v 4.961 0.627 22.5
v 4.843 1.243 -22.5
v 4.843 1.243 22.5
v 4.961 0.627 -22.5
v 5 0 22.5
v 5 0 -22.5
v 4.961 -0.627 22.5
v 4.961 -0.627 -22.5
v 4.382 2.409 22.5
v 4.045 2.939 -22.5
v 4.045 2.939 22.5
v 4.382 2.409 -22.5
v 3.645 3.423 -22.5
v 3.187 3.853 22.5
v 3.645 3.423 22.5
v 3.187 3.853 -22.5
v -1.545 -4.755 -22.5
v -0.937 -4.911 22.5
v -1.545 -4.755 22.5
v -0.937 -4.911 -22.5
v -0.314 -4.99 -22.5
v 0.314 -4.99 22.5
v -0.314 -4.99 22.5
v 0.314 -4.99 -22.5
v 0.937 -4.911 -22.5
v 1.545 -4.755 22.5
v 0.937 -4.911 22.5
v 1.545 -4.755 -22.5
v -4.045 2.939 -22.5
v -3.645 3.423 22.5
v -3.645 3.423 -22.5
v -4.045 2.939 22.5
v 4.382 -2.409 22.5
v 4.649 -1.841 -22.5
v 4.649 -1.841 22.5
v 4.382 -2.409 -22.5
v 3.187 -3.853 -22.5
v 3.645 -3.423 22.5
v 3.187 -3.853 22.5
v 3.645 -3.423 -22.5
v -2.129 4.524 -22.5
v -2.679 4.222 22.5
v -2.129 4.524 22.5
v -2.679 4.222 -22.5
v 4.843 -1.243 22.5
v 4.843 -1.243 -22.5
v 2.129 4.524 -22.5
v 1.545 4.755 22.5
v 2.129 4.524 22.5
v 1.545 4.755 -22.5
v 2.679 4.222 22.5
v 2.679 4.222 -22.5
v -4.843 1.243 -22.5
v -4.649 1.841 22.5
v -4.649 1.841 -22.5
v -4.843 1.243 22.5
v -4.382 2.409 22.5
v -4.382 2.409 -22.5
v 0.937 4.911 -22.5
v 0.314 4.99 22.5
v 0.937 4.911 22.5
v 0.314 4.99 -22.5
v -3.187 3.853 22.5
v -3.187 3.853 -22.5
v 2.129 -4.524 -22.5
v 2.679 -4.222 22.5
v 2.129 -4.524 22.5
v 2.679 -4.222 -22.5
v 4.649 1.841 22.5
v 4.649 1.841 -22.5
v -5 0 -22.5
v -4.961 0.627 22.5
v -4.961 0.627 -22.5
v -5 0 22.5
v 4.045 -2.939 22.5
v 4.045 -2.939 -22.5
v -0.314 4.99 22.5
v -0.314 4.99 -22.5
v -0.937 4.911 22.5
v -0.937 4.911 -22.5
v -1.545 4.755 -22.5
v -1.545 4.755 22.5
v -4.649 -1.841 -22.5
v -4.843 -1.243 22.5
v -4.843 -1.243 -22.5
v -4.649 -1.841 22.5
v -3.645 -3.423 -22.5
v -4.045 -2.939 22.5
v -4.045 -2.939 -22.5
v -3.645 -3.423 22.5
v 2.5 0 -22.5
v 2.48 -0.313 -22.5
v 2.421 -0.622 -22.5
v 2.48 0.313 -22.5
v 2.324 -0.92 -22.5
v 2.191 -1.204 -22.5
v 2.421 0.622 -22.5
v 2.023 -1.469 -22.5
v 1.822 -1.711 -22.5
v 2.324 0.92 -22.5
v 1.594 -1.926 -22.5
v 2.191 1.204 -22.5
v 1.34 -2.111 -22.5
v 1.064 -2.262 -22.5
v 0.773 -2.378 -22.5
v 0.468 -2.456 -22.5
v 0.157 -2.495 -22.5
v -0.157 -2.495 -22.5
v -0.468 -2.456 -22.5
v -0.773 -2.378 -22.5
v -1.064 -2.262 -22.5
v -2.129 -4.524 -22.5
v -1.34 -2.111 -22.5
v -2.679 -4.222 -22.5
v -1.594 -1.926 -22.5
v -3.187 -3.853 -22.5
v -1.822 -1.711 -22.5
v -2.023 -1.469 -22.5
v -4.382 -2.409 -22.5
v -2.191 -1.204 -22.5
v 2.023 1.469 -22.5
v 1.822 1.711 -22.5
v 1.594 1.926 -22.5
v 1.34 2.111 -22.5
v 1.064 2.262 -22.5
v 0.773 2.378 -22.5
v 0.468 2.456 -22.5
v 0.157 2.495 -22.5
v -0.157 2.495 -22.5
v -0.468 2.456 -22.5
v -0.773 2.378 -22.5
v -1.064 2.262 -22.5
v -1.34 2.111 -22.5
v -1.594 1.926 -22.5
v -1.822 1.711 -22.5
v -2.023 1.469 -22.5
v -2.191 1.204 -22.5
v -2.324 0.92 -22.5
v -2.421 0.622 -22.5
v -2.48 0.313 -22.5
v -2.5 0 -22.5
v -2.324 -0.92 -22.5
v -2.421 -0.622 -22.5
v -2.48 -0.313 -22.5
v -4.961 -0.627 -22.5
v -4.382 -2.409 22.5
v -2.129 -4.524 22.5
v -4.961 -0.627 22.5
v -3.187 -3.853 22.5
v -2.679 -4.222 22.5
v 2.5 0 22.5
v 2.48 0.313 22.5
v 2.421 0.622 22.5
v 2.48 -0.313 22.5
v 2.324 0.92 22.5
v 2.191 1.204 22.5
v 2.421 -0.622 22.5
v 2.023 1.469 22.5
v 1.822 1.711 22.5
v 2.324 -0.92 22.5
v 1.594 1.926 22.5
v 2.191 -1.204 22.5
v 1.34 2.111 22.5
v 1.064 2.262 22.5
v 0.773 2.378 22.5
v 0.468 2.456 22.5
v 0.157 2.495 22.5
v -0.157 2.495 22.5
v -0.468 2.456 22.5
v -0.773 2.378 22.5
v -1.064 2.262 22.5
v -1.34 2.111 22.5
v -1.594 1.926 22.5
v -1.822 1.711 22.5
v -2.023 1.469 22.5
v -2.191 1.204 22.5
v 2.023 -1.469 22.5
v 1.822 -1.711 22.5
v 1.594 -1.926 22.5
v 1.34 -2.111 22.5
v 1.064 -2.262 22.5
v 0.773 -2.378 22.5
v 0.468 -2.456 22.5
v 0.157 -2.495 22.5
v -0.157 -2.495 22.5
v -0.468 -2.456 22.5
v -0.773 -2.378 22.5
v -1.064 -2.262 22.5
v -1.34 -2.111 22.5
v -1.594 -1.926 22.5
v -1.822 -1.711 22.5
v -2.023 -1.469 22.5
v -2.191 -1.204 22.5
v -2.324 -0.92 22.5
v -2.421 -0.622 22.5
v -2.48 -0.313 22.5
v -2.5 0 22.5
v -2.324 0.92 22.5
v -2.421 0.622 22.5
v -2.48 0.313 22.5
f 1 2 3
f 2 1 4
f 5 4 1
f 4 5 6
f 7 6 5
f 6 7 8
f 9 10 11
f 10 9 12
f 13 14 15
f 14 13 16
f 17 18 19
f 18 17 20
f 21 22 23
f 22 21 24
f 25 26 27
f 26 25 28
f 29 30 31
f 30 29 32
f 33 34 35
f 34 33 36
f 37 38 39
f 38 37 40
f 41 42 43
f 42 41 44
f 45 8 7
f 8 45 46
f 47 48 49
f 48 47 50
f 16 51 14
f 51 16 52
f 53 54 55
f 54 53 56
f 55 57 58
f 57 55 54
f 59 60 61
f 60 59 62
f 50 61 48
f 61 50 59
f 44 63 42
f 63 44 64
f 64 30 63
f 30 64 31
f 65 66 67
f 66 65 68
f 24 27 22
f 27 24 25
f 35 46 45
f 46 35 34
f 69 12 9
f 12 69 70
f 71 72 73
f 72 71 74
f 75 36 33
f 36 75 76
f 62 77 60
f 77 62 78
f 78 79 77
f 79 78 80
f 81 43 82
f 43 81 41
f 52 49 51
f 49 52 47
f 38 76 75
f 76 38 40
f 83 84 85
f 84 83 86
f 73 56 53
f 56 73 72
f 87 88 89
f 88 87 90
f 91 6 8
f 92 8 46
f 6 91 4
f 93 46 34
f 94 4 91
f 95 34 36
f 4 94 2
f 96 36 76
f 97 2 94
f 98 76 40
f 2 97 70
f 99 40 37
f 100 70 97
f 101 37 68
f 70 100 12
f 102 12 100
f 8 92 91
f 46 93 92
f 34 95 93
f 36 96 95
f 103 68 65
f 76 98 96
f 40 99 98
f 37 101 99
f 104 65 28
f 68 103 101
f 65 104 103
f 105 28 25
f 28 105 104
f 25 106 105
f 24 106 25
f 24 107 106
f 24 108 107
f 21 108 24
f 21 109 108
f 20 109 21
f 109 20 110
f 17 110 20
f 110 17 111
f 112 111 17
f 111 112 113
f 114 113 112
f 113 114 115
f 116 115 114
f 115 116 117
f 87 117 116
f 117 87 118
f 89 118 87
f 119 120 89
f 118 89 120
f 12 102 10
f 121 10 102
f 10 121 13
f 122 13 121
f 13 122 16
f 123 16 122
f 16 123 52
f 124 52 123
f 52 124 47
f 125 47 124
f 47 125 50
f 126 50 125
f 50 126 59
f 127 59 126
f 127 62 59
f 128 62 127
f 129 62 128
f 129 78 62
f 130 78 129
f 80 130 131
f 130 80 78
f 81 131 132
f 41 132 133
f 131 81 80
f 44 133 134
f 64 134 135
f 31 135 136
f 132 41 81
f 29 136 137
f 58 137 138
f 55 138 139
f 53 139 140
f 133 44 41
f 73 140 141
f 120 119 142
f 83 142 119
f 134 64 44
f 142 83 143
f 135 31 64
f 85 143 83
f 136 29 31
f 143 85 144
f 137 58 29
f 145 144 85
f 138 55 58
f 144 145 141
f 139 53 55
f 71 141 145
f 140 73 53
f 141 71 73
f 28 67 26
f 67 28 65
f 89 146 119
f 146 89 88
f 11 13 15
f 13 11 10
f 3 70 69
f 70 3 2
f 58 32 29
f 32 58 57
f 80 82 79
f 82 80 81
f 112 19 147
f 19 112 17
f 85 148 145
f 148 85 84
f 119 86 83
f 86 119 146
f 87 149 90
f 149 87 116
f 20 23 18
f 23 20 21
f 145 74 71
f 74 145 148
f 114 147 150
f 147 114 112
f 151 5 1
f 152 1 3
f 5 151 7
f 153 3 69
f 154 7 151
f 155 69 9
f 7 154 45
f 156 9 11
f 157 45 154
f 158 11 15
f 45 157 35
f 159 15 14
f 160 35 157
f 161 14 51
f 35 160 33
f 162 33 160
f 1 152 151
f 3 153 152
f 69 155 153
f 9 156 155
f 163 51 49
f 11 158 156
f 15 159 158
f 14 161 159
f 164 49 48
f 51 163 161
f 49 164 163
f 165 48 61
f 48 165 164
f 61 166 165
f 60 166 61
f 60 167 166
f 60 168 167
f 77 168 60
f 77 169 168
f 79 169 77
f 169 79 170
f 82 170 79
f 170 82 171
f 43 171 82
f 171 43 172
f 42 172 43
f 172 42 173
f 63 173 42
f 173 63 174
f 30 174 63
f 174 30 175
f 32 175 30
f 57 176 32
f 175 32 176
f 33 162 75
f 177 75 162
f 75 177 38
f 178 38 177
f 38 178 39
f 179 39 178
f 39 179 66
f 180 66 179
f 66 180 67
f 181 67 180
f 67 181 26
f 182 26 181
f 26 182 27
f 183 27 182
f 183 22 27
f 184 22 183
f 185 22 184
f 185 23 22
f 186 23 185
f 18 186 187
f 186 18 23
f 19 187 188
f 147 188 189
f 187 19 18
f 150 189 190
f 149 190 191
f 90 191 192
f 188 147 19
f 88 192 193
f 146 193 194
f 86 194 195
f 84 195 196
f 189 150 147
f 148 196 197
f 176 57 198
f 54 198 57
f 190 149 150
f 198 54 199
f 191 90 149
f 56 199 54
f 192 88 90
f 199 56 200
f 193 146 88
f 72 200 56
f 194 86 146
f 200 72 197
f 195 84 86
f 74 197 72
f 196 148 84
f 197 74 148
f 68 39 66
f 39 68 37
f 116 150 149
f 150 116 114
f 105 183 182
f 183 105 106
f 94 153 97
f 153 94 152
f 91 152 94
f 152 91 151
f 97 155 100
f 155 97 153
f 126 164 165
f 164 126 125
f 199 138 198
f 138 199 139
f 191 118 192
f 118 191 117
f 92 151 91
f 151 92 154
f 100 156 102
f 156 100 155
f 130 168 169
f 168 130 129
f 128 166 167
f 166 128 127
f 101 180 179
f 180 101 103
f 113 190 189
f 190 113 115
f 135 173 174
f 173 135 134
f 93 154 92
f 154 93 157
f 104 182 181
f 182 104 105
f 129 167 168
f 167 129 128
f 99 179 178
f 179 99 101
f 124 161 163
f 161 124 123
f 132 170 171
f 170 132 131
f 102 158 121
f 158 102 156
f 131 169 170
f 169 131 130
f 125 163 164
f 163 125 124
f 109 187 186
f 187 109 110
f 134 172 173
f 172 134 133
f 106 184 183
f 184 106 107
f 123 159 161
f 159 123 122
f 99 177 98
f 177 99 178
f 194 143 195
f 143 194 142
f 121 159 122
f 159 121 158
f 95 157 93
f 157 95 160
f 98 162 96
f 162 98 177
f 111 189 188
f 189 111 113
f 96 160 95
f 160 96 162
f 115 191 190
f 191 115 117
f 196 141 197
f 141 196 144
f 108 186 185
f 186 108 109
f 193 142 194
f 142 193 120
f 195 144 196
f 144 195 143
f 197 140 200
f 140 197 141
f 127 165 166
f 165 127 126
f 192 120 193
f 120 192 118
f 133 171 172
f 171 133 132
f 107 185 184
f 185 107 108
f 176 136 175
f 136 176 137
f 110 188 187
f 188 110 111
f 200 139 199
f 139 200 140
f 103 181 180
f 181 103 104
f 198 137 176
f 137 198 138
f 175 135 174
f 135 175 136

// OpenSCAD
$fn = 50;


difference() {
	union() {
		translate(v = [0, 0, -22.5000000000]) {
			cylinder(h = 45, r = 5.0000000000);
		}
	}
	union() {
		translate(v = [0, 0, -100.0000000000]) {
			cylinder(h = 200, r = 2.5000000000);
		}
	}
}
